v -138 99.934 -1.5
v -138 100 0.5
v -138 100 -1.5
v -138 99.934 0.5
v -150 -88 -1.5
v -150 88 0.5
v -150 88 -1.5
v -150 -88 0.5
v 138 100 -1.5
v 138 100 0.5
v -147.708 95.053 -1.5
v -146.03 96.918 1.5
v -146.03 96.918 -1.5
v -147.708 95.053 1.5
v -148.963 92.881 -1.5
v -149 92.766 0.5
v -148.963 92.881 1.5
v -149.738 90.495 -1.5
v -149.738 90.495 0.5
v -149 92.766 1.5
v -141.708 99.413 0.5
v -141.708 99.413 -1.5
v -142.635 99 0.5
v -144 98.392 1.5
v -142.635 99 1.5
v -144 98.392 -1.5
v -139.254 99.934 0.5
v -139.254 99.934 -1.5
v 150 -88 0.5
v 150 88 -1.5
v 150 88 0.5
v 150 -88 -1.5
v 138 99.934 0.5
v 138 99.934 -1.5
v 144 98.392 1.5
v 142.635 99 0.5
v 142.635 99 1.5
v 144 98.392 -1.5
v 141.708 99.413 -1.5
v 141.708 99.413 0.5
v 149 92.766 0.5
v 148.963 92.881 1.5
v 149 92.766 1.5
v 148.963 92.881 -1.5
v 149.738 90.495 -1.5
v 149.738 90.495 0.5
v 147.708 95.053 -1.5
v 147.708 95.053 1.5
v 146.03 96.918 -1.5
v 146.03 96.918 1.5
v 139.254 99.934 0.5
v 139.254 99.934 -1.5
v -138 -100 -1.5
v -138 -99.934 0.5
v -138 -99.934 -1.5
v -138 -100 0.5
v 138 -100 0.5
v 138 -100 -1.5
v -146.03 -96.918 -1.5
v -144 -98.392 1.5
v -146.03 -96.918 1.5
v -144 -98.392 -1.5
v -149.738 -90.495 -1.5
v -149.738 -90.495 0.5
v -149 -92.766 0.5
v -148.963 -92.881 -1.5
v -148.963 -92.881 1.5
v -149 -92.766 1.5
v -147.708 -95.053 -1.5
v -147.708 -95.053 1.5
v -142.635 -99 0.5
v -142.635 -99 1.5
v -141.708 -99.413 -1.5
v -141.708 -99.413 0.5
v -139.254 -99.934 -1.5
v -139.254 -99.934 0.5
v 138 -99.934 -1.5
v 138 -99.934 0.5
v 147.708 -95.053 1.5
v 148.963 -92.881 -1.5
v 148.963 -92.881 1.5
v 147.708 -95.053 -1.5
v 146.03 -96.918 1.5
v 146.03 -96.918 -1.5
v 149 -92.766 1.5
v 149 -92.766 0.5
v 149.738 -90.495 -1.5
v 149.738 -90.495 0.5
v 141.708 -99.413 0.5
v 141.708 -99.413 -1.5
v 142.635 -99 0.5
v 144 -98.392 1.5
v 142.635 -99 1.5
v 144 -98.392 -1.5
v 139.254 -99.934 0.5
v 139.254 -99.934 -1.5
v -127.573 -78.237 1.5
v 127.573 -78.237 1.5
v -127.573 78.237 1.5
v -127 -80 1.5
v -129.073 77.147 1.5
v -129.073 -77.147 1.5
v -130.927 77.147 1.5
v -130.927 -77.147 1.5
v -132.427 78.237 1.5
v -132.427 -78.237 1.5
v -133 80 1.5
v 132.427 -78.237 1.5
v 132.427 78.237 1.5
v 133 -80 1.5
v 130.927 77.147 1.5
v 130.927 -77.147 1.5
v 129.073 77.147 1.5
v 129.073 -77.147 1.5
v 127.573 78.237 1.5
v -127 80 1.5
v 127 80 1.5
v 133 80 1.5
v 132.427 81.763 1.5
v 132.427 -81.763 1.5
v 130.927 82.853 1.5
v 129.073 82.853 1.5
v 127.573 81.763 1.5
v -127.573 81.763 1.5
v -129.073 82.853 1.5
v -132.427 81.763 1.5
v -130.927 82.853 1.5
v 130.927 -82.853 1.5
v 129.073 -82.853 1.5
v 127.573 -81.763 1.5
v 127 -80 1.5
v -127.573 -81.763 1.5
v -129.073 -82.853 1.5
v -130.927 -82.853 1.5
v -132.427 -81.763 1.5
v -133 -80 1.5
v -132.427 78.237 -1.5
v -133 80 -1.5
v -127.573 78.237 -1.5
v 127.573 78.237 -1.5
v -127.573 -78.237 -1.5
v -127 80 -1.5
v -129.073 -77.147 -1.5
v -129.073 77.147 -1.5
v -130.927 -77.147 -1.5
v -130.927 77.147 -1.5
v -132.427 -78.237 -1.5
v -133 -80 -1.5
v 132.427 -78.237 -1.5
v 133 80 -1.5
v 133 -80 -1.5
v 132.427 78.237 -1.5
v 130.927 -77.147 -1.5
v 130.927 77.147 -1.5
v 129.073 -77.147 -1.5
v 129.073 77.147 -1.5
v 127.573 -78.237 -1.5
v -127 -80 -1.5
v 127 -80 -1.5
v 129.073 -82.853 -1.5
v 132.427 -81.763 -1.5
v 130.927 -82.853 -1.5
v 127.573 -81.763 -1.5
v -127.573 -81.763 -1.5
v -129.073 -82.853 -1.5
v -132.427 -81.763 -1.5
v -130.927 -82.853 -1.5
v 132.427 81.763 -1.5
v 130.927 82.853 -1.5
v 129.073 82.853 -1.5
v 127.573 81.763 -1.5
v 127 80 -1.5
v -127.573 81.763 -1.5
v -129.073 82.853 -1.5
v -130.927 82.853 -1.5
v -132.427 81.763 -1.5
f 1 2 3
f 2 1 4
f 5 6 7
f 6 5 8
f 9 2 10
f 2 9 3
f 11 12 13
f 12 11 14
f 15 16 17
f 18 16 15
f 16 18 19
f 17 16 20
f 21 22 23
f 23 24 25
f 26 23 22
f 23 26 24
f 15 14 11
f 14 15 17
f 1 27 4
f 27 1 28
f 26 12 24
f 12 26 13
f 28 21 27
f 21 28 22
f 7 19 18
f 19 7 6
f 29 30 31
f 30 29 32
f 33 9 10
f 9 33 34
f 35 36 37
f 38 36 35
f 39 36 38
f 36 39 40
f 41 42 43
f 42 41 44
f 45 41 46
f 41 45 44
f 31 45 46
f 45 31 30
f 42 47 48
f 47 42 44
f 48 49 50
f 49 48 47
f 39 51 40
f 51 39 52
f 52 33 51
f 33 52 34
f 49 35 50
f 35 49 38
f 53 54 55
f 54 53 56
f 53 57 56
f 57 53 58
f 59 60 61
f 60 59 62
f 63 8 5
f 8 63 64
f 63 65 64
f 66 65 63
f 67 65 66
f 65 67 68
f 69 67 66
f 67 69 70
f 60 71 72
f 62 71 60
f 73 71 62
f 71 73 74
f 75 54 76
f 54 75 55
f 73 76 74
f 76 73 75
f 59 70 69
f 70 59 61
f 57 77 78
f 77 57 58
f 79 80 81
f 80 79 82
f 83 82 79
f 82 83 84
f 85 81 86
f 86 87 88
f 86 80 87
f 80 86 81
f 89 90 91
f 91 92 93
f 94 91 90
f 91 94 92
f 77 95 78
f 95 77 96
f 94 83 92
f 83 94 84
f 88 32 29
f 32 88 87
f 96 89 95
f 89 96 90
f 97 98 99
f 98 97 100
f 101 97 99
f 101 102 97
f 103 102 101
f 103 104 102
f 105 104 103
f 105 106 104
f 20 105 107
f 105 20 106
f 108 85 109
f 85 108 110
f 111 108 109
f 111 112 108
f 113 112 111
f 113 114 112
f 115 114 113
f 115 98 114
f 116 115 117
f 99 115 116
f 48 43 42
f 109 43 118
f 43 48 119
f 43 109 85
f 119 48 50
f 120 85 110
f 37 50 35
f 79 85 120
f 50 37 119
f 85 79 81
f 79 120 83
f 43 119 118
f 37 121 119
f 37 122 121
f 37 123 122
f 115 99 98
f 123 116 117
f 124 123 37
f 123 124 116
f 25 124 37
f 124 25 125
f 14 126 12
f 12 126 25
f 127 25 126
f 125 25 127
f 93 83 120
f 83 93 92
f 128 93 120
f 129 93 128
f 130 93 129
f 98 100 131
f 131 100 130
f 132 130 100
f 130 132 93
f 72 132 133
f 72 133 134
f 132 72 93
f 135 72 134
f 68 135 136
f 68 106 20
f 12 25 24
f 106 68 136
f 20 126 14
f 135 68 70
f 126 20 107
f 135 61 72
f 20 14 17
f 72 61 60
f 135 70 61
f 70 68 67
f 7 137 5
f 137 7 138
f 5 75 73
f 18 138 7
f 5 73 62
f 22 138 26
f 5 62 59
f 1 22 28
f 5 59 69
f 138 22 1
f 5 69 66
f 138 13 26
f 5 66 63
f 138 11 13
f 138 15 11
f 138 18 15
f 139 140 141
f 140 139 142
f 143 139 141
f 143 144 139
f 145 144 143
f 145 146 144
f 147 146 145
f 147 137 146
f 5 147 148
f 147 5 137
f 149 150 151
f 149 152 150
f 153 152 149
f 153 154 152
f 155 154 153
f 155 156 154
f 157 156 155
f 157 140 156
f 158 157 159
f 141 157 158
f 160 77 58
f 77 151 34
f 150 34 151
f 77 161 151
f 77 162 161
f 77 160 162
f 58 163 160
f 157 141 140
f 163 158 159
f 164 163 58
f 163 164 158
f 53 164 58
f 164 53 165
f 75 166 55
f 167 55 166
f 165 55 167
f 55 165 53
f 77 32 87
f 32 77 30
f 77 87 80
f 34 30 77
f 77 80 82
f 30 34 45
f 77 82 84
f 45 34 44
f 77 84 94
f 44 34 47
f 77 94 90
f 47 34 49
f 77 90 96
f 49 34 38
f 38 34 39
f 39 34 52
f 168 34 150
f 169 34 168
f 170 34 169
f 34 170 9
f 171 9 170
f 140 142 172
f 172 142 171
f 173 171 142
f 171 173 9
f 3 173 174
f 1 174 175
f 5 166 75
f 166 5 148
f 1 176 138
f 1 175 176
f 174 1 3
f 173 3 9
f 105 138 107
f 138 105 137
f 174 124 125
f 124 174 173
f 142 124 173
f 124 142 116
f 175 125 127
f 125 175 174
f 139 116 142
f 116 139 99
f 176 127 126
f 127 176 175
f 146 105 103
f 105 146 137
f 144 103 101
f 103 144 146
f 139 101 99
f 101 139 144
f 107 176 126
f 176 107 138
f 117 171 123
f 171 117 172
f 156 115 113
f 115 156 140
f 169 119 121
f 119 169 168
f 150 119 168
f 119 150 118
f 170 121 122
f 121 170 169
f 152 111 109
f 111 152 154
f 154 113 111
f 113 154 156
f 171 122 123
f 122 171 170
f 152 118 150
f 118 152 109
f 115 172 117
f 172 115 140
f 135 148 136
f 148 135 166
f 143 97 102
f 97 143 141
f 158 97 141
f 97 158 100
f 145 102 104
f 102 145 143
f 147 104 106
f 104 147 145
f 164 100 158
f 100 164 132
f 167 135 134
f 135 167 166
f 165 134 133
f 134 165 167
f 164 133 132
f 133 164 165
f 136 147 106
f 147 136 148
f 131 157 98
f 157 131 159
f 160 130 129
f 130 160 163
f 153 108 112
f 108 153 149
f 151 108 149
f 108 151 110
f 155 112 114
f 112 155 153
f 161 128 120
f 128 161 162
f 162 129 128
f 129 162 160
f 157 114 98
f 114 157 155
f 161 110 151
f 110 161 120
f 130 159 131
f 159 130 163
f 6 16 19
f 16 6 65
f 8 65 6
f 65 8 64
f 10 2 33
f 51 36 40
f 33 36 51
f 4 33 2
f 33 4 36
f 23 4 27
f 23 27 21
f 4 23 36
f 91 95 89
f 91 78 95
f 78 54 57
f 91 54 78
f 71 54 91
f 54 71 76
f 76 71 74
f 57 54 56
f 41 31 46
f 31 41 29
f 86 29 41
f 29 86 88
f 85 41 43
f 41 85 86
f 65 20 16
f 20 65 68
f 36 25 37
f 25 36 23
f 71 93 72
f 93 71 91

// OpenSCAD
// Parameters
sheet_length = 300; //[150:600:1]
sheet_width = 200; //[100:400:1]
sheet_thickness = 3; //[1.5:6:0.5]
corner_radius = 12; //[6:24:1]
hole_diameter = 6; //[3:12:0.5]
hole_edge_offset = 20; //[10:40:1]
chamfer_size = 1; //[0.5:3:0.25]
overlap = 1; //[0.5:2:0.5]

// Base shapes
module acrylic_sheet() {
  cube([sheet_length, sheet_width, sheet_thickness], center=true);
}

module corner_rounding_cyl() {
  cylinder(r=corner_radius, h=sheet_thickness + 2*overlap, center=true);
}

module corner_rounding_box() {
  cube([corner_radius, corner_radius, sheet_thickness + 2*overlap], center=true);
}

module mounting_hole_cyl() {
  cylinder(r=hole_diameter/2, h=sheet_thickness + 2*overlap, center=true);
}

module edge_chamfer_wedge_x() {
  cube([chamfer_size, sheet_width + 2*overlap, chamfer_size], center=true);
}

module edge_chamfer_wedge_y() {
  cube([sheet_length + 2*overlap, chamfer_size, chamfer_size], center=true);
}

// Corner rounding
module corner_rounding() {
  union() {
    translate([-sheet_length/2 + corner_radius/2, sheet_width/2 - corner_radius/2, 0])
      difference() {
        corner_rounding_box();
        translate([corner_radius/2, -corner_radius/2, 0]) corner_rounding_cyl();
      }
    translate([sheet_length/2 - corner_radius/2, sheet_width/2 - corner_radius/2, 0])
      difference() {
        corner_rounding_box();
        translate([-corner_radius/2, -corner_radius/2, 0]) corner_rounding_cyl();
      }
    translate([-sheet_length/2 + corner_radius/2, -sheet_width/2 + corner_radius/2, 0])
      difference() {
        corner_rounding_box();
        translate([corner_radius/2, corner_radius/2, 0]) corner_rounding_cyl();
      }
    translate([sheet_length/2 - corner_radius/2, -sheet_width/2 + corner_radius/2, 0])
      difference() {
        corner_rounding_box();
        translate([-corner_radius/2, corner_radius/2, 0]) corner_rounding_cyl();
      }
  }
}

// Mounting holes
module mounting_holes() {
  union() {
    translate([-sheet_length/2 + hole_edge_offset, sheet_width/2 - hole_edge_offset, 0])
      mounting_hole_cyl();
    translate([sheet_length/2 - hole_edge_offset, sheet_width/2 - hole_edge_offset, 0])
      mounting_hole_cyl();
    translate([-sheet_length/2 + hole_edge_offset, -sheet_width/2 + hole_edge_offset, 0])
      mounting_hole_cyl();
    translate([sheet_length/2 - hole_edge_offset, -sheet_width/2 + hole_edge_offset, 0])
      mounting_hole_cyl();
  }
}

// Edge chamfer
module edge_chamfer() {
  union() {
    translate([sheet_length/2 - chamfer_size/2, 0, sheet_thickness/2 - chamfer_size/2])
      edge_chamfer_wedge_x();
    translate([-sheet_length/2 + chamfer_size/2, 0, sheet_thickness/2 - chamfer_size/2])
      edge_chamfer_wedge_x();
    translate([0, sheet_width/2 - chamfer_size/2, sheet_thickness/2 - chamfer_size/2])
      edge_chamfer_wedge_y();
    translate([0, -sheet_width/2 + chamfer_size/2, sheet_thickness/2 - chamfer_size/2])
      edge_chamfer_wedge_y();
  }
}

// Final sheet with all features
module sheet_final() {
  difference() {
    difference() {
      difference() {
        acrylic_sheet();
        corner_rounding();
      }
      mounting_holes();
    }
    edge_chamfer();
  }
}

// Render the final sheet
color([0.85, 0.85, 0.8]) sheet_final();
